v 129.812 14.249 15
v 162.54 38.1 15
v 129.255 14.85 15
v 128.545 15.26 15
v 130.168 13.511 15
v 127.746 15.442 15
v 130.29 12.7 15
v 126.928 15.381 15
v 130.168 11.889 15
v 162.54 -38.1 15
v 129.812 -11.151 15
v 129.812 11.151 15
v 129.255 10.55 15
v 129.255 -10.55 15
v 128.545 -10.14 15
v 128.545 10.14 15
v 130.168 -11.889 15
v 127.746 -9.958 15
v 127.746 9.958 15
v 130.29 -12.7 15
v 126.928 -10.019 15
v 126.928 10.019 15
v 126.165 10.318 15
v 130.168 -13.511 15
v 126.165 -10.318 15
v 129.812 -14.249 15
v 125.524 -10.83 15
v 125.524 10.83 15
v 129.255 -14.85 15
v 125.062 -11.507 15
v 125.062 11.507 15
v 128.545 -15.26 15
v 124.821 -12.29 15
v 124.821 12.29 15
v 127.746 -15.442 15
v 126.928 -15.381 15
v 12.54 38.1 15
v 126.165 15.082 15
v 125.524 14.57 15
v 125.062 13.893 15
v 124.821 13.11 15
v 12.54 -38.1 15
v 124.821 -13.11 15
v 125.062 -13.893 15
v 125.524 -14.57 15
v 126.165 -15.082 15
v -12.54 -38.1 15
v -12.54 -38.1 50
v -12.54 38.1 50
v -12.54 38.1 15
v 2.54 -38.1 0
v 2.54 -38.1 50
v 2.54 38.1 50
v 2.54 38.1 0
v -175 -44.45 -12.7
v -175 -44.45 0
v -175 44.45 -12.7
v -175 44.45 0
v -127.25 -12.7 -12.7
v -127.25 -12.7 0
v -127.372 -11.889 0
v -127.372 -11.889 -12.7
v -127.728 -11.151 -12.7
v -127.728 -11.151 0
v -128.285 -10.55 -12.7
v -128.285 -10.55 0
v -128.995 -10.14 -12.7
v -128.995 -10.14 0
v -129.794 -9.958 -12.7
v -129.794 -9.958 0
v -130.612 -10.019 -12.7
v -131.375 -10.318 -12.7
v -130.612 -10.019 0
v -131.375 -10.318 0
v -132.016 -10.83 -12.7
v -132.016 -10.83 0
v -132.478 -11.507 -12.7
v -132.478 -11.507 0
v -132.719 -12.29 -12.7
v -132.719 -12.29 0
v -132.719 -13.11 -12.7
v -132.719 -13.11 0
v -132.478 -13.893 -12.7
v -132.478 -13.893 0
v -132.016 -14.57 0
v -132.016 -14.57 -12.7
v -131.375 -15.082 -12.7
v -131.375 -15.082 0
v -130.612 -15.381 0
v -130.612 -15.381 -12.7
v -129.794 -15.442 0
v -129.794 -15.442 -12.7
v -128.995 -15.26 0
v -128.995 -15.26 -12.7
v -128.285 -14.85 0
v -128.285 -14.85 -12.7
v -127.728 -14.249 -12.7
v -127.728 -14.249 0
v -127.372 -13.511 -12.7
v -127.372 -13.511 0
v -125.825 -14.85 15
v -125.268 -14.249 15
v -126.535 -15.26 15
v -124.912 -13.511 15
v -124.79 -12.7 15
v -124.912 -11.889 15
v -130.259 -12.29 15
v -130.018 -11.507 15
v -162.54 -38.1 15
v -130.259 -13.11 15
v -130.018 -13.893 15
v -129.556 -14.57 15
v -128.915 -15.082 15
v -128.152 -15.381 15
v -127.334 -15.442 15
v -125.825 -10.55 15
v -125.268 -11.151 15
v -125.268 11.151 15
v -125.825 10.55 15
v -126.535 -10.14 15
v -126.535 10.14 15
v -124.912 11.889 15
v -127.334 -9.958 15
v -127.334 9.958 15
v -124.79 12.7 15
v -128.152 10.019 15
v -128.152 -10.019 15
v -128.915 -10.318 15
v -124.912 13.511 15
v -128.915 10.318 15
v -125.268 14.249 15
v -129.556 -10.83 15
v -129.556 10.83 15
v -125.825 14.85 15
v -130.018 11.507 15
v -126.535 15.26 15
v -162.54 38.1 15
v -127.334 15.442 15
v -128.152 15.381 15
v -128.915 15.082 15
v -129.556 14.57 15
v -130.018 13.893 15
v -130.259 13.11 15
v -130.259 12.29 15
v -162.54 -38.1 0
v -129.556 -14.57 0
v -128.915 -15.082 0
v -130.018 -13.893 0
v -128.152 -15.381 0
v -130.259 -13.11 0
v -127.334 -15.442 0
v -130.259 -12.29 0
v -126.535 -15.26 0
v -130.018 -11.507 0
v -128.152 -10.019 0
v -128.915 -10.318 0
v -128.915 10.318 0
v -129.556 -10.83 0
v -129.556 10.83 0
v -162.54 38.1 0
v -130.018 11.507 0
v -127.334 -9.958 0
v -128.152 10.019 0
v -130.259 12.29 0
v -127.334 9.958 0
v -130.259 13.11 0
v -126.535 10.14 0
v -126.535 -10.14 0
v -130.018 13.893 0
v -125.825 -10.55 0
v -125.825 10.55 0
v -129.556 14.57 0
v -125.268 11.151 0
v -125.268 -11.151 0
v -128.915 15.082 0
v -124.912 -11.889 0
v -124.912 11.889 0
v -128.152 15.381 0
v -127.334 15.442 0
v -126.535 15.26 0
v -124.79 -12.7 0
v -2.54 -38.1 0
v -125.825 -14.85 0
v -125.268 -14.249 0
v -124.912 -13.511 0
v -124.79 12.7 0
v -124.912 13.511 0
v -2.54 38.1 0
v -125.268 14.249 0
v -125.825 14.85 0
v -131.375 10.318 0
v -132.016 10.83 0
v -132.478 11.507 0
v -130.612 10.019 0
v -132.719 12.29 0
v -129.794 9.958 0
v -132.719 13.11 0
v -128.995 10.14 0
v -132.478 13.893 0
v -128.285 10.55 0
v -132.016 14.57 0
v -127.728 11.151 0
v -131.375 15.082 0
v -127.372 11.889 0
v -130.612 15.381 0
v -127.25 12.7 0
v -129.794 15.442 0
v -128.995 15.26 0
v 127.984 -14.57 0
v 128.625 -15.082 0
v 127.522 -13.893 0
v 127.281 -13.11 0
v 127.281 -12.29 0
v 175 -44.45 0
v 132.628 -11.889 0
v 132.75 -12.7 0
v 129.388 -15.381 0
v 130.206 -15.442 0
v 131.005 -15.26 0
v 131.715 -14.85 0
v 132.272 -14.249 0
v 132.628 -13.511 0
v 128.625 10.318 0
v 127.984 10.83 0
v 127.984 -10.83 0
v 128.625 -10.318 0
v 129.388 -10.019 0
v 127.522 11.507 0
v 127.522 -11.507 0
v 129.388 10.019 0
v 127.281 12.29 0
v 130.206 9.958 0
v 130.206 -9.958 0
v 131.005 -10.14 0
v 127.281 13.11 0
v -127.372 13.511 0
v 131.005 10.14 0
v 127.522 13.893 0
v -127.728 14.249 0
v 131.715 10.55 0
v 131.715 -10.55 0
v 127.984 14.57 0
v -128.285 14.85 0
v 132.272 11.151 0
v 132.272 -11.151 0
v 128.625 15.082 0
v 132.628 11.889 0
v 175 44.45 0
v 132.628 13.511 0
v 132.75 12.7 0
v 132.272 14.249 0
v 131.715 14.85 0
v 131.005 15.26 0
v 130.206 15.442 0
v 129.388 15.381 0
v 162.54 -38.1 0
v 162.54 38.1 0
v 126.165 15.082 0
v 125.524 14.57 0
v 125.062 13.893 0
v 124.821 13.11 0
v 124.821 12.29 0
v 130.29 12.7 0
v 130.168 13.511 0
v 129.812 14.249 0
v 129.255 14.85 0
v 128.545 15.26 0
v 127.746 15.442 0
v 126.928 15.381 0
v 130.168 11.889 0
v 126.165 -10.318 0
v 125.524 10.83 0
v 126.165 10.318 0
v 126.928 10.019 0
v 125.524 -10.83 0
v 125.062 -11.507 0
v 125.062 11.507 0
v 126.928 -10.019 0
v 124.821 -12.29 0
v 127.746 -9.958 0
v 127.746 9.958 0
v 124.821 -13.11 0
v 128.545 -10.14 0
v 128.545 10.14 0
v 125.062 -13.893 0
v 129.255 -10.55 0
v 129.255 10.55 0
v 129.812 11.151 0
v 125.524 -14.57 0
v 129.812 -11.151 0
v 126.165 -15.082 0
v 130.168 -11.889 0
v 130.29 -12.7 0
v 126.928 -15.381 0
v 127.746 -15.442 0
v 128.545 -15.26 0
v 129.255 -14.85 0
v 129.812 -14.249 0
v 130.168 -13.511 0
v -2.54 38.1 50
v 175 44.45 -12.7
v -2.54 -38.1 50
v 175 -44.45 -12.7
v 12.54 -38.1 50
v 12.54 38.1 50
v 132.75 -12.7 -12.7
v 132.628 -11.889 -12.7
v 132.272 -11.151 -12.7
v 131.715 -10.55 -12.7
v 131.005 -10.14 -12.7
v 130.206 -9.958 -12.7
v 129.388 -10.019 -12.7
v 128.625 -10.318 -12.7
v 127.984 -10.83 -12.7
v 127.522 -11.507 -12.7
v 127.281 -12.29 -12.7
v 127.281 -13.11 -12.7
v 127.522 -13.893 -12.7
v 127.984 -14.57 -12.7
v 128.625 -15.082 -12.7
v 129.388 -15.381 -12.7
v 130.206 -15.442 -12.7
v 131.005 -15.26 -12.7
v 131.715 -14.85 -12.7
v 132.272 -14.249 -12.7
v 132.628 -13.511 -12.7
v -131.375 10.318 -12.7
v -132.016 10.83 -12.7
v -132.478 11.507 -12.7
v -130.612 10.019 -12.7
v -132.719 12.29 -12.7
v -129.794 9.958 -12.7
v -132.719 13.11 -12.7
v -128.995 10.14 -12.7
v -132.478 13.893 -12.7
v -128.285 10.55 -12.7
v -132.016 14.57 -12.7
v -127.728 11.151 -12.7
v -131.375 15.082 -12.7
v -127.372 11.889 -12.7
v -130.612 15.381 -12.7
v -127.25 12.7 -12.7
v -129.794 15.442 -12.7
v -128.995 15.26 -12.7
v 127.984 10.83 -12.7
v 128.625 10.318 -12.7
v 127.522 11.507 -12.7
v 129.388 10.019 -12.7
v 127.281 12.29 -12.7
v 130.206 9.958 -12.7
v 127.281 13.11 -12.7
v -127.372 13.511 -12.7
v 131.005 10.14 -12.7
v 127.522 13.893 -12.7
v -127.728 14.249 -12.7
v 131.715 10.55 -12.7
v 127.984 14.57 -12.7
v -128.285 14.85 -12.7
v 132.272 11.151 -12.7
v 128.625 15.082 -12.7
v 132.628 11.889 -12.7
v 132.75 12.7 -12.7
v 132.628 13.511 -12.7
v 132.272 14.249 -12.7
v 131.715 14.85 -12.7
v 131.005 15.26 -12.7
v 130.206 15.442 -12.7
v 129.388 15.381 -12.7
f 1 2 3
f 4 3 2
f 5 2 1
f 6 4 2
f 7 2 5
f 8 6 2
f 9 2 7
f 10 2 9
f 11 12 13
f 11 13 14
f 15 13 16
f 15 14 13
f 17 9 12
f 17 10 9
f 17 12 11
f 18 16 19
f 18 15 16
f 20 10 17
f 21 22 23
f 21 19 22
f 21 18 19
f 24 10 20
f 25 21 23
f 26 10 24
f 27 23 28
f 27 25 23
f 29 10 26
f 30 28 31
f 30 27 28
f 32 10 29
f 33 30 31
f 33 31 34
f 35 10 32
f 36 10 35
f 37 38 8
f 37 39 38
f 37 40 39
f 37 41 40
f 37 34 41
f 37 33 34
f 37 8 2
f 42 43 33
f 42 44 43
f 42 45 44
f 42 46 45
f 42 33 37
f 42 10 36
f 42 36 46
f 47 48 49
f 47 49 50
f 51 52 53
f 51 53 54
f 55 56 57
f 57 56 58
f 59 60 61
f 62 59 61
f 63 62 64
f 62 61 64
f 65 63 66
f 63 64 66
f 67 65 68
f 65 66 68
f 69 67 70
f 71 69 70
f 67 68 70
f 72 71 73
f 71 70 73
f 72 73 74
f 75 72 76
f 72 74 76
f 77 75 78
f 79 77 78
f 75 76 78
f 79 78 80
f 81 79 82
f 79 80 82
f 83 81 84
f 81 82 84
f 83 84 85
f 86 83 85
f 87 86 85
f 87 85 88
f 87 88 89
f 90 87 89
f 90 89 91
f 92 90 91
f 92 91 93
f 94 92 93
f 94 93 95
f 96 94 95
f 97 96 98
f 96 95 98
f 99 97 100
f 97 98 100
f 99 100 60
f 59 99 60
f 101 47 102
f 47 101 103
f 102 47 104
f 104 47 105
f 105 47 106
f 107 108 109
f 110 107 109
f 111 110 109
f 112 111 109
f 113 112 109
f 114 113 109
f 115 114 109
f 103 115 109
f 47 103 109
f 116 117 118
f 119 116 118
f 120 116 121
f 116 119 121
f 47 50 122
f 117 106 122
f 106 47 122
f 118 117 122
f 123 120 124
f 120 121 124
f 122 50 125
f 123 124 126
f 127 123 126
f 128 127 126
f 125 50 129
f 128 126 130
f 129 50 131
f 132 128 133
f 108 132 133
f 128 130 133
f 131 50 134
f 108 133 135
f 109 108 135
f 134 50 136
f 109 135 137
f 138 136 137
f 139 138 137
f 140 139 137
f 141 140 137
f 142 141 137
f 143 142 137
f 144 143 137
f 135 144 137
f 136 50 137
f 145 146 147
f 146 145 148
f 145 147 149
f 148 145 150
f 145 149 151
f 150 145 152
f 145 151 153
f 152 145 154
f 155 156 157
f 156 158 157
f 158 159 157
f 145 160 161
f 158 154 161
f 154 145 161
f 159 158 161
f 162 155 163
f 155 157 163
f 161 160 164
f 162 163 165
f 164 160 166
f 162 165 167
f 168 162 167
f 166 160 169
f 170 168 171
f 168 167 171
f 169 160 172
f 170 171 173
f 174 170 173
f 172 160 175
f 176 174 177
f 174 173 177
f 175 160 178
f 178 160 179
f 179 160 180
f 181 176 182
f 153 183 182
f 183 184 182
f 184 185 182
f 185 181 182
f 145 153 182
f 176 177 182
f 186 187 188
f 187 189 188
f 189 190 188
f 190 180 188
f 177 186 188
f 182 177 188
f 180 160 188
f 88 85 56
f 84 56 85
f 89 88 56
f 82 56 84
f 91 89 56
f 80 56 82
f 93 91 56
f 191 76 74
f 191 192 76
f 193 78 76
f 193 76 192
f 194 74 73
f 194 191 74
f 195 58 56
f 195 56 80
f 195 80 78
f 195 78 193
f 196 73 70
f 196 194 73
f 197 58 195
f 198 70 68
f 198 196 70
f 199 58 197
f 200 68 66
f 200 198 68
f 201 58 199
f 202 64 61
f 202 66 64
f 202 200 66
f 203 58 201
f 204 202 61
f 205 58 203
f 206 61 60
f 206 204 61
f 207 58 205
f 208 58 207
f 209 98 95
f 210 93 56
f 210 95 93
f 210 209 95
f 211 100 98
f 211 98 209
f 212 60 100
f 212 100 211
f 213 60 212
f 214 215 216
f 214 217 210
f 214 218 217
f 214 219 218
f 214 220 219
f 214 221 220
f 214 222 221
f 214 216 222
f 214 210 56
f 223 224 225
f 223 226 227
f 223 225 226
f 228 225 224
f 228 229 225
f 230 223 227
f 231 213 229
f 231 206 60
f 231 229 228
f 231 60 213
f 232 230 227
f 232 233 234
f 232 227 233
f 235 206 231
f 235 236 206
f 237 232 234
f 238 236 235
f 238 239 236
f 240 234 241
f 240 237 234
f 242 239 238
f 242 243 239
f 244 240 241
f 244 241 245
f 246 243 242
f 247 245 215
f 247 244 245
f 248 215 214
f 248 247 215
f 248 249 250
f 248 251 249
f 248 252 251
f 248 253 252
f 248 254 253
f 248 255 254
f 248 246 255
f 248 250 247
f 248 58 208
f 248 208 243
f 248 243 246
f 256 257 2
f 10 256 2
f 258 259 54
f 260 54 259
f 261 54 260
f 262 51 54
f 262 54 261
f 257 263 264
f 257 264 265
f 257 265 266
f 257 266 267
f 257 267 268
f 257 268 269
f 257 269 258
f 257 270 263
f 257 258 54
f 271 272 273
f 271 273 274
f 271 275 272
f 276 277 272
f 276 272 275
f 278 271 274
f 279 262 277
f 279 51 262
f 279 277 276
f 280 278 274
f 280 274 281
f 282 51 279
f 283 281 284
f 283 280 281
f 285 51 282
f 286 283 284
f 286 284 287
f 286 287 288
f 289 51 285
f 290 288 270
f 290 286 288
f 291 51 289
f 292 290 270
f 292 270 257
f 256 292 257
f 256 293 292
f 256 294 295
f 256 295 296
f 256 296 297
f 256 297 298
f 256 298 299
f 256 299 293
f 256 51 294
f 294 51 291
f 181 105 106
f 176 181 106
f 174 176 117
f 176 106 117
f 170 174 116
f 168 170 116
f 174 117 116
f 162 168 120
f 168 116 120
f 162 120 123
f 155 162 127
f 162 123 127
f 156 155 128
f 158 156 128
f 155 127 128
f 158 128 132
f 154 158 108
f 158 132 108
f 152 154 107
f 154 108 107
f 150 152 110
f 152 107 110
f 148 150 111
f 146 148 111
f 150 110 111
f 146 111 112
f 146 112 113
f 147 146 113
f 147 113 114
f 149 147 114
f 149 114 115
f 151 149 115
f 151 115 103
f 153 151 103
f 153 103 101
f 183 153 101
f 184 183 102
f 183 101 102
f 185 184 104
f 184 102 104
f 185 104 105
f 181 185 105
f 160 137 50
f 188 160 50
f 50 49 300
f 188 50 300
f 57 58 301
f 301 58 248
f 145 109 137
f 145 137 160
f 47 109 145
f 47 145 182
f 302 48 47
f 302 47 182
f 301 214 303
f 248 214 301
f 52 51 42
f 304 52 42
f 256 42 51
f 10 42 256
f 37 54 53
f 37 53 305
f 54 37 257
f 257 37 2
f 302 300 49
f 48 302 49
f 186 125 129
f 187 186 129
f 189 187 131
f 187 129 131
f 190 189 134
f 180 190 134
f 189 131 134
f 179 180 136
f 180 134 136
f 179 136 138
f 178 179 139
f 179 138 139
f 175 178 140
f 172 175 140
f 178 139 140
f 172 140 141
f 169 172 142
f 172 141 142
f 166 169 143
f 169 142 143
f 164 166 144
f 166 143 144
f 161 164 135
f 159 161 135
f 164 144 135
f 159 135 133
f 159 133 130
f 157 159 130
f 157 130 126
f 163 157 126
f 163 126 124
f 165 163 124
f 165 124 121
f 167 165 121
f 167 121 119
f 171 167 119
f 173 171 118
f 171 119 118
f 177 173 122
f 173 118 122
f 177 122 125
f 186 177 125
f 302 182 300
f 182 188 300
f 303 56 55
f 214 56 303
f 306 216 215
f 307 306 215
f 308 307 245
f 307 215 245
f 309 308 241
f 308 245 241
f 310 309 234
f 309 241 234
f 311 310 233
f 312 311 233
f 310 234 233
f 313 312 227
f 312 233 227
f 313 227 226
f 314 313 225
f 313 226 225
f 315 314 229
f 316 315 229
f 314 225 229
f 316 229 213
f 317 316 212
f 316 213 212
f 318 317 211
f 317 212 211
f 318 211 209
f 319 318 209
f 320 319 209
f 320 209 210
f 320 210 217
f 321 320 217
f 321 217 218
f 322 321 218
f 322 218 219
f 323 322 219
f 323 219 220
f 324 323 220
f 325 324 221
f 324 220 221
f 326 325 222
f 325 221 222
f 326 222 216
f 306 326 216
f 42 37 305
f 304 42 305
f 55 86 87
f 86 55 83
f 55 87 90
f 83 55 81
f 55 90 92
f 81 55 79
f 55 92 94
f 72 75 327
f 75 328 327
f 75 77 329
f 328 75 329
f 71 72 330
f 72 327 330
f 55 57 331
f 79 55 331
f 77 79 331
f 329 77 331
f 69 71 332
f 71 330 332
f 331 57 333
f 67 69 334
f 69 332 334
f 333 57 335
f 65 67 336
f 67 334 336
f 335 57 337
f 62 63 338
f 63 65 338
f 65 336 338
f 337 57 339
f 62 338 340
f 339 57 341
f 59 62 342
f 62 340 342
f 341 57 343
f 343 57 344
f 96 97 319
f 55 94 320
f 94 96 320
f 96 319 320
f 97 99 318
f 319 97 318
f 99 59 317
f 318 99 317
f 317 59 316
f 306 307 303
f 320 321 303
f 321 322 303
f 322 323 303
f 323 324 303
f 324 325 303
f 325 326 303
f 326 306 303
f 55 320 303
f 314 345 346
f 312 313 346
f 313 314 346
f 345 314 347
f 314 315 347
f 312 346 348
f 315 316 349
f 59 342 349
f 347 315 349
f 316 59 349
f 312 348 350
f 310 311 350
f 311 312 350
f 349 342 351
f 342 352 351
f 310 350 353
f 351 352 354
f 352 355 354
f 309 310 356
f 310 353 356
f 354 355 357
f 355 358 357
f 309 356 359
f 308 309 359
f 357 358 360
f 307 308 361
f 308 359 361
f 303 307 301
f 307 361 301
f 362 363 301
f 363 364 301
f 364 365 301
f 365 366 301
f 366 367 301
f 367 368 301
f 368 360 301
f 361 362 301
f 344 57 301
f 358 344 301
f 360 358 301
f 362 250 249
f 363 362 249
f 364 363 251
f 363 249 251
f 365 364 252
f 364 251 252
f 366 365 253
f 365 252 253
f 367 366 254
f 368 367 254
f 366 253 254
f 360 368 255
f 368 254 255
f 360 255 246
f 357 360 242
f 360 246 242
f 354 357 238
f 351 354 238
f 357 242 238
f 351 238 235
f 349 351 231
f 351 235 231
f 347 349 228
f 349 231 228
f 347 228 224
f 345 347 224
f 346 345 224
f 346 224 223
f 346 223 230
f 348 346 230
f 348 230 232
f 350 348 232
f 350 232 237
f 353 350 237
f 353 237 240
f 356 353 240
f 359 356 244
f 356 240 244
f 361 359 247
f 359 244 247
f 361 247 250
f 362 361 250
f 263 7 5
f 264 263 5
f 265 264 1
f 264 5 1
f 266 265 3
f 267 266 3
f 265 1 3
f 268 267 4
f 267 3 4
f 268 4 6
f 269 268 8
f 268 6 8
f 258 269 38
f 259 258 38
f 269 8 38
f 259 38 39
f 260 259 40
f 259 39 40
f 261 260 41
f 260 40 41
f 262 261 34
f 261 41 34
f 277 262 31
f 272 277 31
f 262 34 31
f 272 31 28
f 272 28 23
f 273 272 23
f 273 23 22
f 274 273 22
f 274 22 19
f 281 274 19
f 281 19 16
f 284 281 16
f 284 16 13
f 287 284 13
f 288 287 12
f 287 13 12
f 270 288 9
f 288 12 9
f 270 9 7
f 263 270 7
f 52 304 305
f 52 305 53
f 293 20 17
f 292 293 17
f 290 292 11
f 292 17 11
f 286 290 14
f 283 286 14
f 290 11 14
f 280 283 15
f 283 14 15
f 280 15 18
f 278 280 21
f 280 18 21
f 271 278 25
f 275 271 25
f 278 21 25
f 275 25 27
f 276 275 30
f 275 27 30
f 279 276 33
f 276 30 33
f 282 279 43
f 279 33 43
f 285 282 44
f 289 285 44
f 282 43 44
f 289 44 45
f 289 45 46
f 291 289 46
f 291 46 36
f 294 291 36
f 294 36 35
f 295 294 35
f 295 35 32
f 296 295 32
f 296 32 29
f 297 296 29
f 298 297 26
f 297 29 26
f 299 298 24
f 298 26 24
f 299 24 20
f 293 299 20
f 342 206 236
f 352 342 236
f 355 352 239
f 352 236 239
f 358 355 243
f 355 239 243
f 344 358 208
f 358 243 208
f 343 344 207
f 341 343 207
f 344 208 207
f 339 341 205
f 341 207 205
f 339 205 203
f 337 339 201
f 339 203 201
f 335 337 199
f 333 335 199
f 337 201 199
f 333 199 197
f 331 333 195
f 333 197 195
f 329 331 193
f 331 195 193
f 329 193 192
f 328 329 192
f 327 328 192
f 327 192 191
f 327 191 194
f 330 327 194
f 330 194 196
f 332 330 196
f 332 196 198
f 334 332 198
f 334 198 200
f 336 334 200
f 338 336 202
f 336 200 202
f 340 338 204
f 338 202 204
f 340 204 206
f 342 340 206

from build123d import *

# Parameters (mm, degrees)
F1_DEPTH = 38.1
F2_W     = 350
F2_H     = 88.9
F2_R     = 2.75
F3_DEPTH = 12.7
F4_R     = 2.75
F5_DEPTH = 15


with BuildPart() as f1:
    # F0 (on Front) → F1 (new body, symmetric)
    with BuildSketch(Plane.XZ):
        Polygon((-12.54, 15), (-162.54, 15), (-162.54, 0), (-2.54, 0), (-2.54, 50), (-12.54, 50), align=None)
        Polygon((12.54, 15), (12.54, 50), (2.54, 50), (2.54, 0), (162.54, 0), (162.54, 15), align=None)
    extrude(amount=F1_DEPTH, both=True)

    # F4 (on face) → F5 (cut, through all)
    with BuildSketch(Plane.XY.offset(15)):
        with Locations((-127.54, -12.7)):
            Circle(F4_R)
        with Locations((127.54, -12.7)):
            Circle(F4_R)
        with Locations((127.54, 12.7)):
            Circle(F4_R)
        with Locations((-127.54, 12.7)):
            Circle(F4_R)
    extrude(amount=-F5_DEPTH, mode=Mode.SUBTRACT)


with BuildPart() as f3:
    # F2 (on Top) → F3 (new body)
    with BuildSketch(Plane.XY):
        Rectangle(F2_W, F2_H)
        with Locations((-130, -12.7)):
            Circle(F2_R, mode=Mode.SUBTRACT)
        with Locations((130, -12.7)):
            Circle(F2_R, mode=Mode.SUBTRACT)
        with Locations((-130, 12.7)):
            Circle(F2_R, mode=Mode.SUBTRACT)
        with Locations((130, 12.7)):
            Circle(F2_R, mode=Mode.SUBTRACT)
    extrude(amount=-F3_DEPTH)


solid = Compound([f1.part, f3.part])
